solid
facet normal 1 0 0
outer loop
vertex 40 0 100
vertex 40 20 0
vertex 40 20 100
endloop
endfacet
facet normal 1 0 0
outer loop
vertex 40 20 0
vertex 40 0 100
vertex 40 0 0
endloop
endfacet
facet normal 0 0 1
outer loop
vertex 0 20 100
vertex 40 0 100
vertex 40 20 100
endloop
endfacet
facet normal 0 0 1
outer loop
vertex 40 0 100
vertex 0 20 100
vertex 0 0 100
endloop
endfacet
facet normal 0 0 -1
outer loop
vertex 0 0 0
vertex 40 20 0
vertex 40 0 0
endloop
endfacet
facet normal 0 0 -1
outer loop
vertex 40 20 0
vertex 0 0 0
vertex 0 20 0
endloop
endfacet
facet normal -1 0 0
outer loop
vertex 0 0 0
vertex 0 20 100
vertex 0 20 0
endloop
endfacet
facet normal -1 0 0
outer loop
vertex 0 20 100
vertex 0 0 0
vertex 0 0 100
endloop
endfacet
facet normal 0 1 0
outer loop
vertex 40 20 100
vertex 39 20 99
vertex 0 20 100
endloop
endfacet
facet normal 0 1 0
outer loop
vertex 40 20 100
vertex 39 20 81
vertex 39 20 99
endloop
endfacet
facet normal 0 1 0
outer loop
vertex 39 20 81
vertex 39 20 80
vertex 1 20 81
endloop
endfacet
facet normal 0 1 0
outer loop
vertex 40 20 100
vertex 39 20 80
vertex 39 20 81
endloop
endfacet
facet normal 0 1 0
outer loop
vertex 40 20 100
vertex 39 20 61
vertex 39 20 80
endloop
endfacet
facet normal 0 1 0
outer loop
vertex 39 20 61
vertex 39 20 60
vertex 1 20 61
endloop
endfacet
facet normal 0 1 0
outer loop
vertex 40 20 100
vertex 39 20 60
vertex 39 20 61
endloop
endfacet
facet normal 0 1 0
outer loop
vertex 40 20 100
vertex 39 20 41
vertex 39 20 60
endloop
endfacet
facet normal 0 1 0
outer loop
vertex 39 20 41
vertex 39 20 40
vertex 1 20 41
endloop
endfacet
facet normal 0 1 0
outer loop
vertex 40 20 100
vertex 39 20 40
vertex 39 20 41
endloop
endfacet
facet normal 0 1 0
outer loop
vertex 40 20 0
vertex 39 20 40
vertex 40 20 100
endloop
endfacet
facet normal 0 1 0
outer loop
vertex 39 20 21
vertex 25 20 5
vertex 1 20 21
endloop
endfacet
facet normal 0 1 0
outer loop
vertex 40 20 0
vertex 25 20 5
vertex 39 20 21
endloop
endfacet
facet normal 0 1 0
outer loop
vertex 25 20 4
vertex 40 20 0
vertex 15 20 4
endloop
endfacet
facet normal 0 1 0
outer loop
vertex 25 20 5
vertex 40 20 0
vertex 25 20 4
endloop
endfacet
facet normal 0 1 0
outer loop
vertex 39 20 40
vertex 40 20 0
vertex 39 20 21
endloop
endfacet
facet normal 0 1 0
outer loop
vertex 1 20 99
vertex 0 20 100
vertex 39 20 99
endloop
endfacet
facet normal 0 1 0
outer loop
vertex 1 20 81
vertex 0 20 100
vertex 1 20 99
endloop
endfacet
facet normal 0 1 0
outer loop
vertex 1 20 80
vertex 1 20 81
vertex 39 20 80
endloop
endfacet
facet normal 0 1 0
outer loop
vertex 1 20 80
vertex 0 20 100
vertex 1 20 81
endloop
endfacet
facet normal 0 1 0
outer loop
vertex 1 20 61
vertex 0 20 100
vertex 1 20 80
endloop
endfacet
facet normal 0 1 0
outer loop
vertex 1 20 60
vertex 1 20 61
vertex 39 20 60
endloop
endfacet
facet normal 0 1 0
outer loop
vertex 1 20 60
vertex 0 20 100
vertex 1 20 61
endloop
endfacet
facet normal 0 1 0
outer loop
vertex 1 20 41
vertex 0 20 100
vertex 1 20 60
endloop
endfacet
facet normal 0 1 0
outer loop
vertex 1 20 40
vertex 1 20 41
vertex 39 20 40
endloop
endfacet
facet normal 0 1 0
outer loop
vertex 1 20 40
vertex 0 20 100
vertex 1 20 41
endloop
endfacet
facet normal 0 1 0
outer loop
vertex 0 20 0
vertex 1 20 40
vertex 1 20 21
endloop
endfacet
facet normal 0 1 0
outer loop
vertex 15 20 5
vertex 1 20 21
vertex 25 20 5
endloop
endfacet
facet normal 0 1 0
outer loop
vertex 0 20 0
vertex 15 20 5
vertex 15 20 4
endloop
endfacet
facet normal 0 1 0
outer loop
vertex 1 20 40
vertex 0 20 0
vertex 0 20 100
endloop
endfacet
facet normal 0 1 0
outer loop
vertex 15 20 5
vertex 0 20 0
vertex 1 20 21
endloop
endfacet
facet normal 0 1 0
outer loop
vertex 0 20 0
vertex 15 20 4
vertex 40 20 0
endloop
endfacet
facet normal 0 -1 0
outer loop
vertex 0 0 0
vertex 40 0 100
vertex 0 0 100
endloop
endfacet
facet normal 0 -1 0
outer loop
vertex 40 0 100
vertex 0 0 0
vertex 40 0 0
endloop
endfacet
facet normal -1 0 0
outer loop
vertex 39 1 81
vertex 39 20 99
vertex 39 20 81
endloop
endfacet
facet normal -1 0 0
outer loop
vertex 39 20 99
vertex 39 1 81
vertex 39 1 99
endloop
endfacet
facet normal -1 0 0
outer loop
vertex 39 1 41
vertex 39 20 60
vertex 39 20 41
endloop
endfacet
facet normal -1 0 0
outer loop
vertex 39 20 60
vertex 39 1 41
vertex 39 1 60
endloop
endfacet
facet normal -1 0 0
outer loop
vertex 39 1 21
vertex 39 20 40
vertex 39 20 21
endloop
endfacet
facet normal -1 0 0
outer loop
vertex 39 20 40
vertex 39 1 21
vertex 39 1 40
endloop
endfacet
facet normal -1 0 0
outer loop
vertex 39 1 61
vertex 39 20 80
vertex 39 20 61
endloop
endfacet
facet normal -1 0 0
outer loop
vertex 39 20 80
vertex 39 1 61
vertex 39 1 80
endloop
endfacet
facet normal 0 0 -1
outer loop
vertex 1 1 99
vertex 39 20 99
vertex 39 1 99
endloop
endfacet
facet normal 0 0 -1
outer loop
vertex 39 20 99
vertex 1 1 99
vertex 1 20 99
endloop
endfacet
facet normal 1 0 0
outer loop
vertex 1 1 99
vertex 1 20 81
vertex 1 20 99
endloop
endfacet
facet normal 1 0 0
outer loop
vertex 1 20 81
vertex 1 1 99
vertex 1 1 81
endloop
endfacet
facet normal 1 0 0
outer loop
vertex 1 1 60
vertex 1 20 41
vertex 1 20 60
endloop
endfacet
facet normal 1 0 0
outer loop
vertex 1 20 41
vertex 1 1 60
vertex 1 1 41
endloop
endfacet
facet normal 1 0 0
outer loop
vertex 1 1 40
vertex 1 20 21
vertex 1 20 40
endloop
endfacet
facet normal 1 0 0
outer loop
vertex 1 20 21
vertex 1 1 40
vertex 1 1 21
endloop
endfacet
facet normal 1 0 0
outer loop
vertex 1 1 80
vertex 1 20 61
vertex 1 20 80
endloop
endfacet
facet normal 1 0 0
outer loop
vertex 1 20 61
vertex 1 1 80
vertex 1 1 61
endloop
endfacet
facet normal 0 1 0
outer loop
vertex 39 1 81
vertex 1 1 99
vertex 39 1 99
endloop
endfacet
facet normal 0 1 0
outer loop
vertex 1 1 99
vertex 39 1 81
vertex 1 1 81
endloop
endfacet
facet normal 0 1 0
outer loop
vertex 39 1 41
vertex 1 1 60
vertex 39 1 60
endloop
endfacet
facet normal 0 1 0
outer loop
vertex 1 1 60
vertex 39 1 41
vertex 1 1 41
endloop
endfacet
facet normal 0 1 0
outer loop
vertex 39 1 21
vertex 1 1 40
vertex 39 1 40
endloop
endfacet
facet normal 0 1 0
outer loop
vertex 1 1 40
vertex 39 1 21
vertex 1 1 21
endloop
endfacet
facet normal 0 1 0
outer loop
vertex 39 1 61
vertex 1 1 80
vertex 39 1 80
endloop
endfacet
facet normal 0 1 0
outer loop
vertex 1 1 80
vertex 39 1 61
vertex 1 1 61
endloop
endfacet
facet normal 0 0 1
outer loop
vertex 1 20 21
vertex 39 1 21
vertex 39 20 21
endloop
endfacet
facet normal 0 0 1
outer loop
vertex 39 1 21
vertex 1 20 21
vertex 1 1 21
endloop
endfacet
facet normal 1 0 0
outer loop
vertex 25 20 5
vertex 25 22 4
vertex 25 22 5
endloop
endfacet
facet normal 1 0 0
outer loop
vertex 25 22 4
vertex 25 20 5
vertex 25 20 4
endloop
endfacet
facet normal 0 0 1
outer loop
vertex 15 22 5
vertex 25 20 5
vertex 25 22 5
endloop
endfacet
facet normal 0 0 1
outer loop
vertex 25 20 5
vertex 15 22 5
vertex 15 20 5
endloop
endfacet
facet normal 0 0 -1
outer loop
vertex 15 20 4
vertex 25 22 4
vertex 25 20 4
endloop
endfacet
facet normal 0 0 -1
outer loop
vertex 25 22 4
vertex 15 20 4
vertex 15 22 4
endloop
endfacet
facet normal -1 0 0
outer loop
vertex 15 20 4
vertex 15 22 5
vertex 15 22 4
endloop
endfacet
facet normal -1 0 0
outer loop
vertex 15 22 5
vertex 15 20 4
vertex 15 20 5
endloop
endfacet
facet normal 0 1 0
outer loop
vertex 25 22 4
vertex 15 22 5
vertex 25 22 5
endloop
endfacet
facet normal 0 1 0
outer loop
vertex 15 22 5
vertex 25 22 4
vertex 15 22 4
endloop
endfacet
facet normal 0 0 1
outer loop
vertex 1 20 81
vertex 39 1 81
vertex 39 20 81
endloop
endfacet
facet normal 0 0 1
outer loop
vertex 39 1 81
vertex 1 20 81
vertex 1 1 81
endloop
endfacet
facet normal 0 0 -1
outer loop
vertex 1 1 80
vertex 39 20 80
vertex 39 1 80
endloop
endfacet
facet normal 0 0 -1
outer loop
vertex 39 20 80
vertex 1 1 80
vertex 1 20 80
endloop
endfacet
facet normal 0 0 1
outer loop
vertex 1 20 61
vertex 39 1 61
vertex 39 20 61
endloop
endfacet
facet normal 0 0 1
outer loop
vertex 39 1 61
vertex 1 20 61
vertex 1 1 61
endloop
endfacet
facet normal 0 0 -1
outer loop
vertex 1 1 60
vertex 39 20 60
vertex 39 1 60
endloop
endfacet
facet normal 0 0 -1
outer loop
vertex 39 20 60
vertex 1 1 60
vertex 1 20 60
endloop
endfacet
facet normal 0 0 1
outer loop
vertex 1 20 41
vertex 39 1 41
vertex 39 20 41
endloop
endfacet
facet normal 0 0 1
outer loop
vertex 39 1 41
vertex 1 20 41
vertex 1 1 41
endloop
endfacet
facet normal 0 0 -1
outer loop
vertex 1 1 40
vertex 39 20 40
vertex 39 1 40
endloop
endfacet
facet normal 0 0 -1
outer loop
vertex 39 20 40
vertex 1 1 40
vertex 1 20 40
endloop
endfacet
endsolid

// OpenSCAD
difference(){
cube([40,20,100]);
translate([1,1,1])cube([38,19,98]);
} 
translate([0,0,1]) cube ([40,20,20]);
translate([15,0,4]) cube ([10,22,1]);
translate([0,0,80]) cube ([40,20,1]);
translate([0,0,60]) cube([40,20,1]);
translate([0,0,40]) cube([40,20,1]);
